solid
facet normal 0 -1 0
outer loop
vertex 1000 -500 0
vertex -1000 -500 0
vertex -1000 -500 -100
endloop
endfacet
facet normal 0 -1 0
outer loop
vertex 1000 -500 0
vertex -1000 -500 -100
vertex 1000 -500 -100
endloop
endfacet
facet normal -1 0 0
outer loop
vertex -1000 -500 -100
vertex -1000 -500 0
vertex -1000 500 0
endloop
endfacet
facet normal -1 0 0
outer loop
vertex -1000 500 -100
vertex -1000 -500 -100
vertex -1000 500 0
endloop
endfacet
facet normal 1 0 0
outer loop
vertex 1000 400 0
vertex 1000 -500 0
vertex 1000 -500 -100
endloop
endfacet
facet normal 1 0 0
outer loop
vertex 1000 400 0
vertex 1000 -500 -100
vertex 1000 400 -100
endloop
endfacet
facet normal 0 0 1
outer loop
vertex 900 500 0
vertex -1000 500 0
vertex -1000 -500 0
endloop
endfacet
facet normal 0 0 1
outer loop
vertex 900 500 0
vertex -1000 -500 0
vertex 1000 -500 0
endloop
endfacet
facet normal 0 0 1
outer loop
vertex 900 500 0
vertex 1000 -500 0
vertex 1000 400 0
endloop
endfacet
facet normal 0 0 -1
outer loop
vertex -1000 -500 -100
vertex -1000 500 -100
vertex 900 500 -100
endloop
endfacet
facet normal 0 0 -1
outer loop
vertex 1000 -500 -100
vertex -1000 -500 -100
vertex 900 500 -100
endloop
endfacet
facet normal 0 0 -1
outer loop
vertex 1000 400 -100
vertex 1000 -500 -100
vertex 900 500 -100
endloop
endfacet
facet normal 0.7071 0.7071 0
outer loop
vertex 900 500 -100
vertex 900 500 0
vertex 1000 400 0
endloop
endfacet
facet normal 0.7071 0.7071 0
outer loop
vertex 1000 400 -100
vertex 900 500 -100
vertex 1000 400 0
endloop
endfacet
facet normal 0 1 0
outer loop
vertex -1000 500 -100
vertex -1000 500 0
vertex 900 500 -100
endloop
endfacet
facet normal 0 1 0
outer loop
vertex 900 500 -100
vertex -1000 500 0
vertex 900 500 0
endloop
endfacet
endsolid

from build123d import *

# Parameters (mm, degrees)
SKETCH1_W           = 2000
SKETCH1_H           = 1000
BOSS_EXTRUDE1_DEPTH = 100
CUT_EXTRUDE1_DEPTH  = 200


with BuildPart() as part:
    # Sketch1 → Boss-Extrude1 (new body)
    with BuildSketch(Plane.XY):
        Rectangle(SKETCH1_W, SKETCH1_H)
    extrude(amount=-BOSS_EXTRUDE1_DEPTH)

    # Sketch2 → Cut-Extrude1 (cut)
    with BuildSketch(Plane.XY):
        Polygon((900, 500), (1000, 400), (1000, 500), align=None)
    extrude(amount=-CUT_EXTRUDE1_DEPTH, mode=Mode.SUBTRACT)


solid = part.part
